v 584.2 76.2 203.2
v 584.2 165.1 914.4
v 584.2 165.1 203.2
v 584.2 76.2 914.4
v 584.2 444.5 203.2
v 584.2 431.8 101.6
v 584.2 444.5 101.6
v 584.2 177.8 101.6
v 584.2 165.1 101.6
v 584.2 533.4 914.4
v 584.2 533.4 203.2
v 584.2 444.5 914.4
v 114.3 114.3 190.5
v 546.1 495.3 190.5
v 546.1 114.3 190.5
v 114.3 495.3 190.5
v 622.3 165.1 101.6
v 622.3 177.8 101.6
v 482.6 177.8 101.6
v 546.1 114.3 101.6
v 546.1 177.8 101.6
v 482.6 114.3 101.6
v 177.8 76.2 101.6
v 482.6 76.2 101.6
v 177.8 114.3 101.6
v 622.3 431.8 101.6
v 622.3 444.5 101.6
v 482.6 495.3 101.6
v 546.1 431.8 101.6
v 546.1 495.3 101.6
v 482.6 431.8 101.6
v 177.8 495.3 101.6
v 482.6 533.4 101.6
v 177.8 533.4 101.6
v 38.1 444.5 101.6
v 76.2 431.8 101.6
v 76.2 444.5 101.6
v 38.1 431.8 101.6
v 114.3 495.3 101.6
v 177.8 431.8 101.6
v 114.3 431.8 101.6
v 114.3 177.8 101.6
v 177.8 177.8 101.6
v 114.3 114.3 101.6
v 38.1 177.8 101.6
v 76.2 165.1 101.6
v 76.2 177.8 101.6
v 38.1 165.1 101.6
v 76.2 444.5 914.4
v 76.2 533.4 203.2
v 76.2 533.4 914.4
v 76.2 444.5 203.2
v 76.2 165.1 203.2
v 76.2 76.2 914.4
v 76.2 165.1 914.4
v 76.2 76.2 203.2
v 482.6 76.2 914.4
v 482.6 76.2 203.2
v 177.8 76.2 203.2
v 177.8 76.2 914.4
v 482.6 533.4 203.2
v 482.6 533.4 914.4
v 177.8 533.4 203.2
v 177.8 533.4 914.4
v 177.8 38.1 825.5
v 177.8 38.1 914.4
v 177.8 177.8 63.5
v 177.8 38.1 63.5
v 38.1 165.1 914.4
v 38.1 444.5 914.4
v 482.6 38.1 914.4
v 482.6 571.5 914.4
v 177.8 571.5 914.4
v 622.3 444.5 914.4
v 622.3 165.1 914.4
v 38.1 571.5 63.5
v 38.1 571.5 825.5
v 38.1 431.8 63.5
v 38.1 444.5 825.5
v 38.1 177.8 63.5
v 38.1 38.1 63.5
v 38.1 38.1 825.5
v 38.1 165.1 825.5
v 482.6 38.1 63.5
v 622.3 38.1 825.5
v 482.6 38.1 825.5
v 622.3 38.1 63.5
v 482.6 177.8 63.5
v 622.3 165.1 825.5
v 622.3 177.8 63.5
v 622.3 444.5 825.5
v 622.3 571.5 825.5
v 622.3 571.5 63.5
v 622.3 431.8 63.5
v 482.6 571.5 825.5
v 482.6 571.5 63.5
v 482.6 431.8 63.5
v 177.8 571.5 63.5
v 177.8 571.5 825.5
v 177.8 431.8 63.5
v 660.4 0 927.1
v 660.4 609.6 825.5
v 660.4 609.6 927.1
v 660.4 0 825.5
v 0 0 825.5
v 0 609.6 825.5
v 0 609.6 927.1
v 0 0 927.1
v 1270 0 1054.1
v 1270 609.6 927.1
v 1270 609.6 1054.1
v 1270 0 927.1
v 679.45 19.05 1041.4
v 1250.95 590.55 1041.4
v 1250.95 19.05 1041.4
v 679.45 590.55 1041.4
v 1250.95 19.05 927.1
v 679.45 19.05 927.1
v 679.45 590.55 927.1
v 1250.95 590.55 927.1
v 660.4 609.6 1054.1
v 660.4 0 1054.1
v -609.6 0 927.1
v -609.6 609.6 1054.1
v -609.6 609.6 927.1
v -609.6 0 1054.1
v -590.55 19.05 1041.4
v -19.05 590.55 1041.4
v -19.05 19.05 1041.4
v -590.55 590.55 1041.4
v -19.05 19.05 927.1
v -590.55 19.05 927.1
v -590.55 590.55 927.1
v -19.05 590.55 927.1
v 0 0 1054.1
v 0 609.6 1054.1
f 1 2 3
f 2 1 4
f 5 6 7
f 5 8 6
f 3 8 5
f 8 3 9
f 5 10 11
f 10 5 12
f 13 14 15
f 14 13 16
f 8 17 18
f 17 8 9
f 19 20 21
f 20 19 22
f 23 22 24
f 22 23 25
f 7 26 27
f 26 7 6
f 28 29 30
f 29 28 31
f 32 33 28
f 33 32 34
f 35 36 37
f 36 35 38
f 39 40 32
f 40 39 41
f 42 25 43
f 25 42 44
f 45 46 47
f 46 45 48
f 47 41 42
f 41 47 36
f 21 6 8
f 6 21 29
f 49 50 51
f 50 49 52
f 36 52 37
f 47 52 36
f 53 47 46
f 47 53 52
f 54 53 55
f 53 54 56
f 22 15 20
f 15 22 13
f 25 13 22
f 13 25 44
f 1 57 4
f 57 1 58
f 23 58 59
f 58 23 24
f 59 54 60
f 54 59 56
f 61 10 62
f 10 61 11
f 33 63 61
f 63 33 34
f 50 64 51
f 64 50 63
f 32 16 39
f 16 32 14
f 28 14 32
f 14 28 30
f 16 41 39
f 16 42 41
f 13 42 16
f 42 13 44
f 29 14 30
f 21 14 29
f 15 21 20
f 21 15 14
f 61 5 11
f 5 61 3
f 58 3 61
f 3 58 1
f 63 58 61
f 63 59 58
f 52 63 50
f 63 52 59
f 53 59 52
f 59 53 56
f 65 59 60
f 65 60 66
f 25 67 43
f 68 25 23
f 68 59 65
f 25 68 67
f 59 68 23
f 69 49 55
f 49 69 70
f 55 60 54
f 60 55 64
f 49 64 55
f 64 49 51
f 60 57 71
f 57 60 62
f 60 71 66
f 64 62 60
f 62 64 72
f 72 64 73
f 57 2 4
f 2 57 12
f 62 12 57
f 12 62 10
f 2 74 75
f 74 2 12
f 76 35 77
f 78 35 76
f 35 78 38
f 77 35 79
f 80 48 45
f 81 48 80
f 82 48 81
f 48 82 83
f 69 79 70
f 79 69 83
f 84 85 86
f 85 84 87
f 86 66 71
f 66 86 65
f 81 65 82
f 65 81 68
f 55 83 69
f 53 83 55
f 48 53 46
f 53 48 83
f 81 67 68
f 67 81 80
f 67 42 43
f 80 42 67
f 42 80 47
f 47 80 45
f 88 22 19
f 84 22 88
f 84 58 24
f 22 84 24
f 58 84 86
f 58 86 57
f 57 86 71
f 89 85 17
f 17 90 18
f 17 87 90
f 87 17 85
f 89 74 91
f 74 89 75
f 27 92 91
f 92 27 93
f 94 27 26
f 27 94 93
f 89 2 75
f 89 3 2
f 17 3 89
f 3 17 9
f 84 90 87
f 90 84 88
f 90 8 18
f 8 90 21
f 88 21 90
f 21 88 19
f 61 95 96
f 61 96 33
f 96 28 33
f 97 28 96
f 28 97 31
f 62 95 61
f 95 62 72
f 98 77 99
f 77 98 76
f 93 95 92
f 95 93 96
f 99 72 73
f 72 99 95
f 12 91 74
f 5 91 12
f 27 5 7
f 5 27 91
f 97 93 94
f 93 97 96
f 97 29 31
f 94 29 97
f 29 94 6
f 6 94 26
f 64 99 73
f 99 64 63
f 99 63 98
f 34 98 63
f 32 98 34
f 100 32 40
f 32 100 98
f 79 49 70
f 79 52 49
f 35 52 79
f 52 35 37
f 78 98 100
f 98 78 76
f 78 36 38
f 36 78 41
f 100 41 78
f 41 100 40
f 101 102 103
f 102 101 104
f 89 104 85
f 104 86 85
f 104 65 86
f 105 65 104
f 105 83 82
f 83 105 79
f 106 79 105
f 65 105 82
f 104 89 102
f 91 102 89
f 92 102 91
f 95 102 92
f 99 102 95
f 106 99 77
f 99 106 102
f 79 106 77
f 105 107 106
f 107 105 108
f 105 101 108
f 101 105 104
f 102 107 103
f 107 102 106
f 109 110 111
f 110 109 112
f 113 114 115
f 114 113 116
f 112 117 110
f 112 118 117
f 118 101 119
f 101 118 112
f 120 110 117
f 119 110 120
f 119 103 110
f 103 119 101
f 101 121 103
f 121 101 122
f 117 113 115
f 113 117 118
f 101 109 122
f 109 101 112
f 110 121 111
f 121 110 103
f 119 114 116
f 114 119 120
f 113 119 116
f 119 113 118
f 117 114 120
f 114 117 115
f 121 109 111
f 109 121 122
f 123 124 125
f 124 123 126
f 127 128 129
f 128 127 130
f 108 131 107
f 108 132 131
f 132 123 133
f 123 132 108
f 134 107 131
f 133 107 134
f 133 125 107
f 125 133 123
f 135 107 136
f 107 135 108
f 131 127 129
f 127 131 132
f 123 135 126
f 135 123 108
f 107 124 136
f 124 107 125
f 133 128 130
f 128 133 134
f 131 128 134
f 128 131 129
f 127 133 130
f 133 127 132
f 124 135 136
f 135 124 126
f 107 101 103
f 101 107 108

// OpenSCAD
union() {
	scale(v = 25.4000000000) {
		translate(v = [3.0000000000, 3.0000000000, 4]) {
			cube(size = [20.0000000000, 1.5000000000, 3.5000000000]);
			translate(v = [0, 16.5000000000, 0]) {
				cube(size = [20.0000000000, 1.5000000000, 3.5000000000]);
			}
			translate(v = [0, 1.5000000000, 0]) {
				cube(size = [1.5000000000, 15.0000000000, 3.5000000000]);
			}
			translate(v = [18.5000000000, 1.5000000000, 0]) {
				cube(size = [1.5000000000, 15.0000000000, 3.5000000000]);
			}
			translate(v = [0, 0, 3.5000000000]) {
				cube(size = [20.0000000000, 18.0000000000, 0.5000000000]);
			}
		}
		translate(v = [1.5000000000, 1.5000000000, 4]) {
			cube(size = [5.5000000000, 1.5000000000, 32]);
			translate(v = [0, 1.5000000000, 0]) {
				cube(size = [1.5000000000, 3.5000000000, 32]);
			}
			translate(v = [0, 0, -1.5000000000]) {
				cube(size = [5.5000000000, 5.5000000000, 1.5000000000]);
			}
		}
		translate(v = [24.5000000000, 1.5000000000, 4]) {
			scale(v = [-1, 1, 1]) {
				cube(size = [5.5000000000, 1.5000000000, 32]);
				translate(v = [0, 1.5000000000, 0]) {
					cube(size = [1.5000000000, 3.5000000000, 32]);
				}
				translate(v = [0, 0, -1.5000000000]) {
					cube(size = [5.5000000000, 5.5000000000, 1.5000000000]);
				}
			}
		}
		translate(v = [24.5000000000, 22.5000000000, 4]) {
			scale(v = [-1, -1, 1]) {
				cube(size = [5.5000000000, 1.5000000000, 32]);
				translate(v = [0, 1.5000000000, 0]) {
					cube(size = [1.5000000000, 3.5000000000, 32]);
				}
				translate(v = [0, 0, -1.5000000000]) {
					cube(size = [5.5000000000, 5.5000000000, 1.5000000000]);
				}
			}
		}
		translate(v = [1.5000000000, 22.5000000000, 4]) {
			scale(v = [1, -1, 1]) {
				cube(size = [5.5000000000, 1.5000000000, 32]);
				translate(v = [0, 1.5000000000, 0]) {
					cube(size = [1.5000000000, 3.5000000000, 32]);
				}
				translate(v = [0, 0, -1.5000000000]) {
					cube(size = [5.5000000000, 5.5000000000, 1.5000000000]);
				}
			}
		}
		translate(v = [0, 0, 32.5000000000]) {
			cube(size = [26, 1.5000000000, 3.5000000000]);
			translate(v = [0, 22.5000000000, 0]) {
				cube(size = [26, 1.5000000000, 3.5000000000]);
			}
			translate(v = [0, 1.5000000000, 0]) {
				cube(size = [1.5000000000, 21.0000000000, 3.5000000000]);
			}
			translate(v = [24.5000000000, 1.5000000000, 0]) {
				cube(size = [1.5000000000, 21.0000000000, 3.5000000000]);
			}
		}
		translate(v = [0, 0, 36]) {
			cube(size = [26, 24, 0.5000000000]);
		}
		translate(v = [26, 0, 36.5000000000]) {
			rotate(a = 0, v = [0, 1, 0]) {
				cube(size = [24, 0.7500000000, 4.5000000000]);
				translate(v = [0, 23.2500000000, 0]) {
					cube(size = [24, 0.7500000000, 4.5000000000]);
				}
				translate(v = [0, 0.7500000000, 0]) {
					cube(size = [0.7500000000, 22.5000000000, 4.5000000000]);
				}
				translate(v = [23.2500000000, 0.7500000000, 0]) {
					cube(size = [0.7500000000, 22.5000000000, 4.5000000000]);
				}
				translate(v = [0, 0, 4.5000000000]) {
					cube(size = [24, 24, 0.5000000000]);
				}
			}
		}
		translate(v = [0, 0, 36.5000000000]) {
			scale(v = [-1, 1, 1]) {
				rotate(a = $t, v = [0, 1, 0]) {
					cube(size = [24, 0.7500000000, 4.5000000000]);
					translate(v = [0, 23.2500000000, 0]) {
						cube(size = [24, 0.7500000000, 4.5000000000]);
					}
					translate(v = [0, 0.7500000000, 0]) {
						cube(size = [0.7500000000, 22.5000000000, 4.5000000000]);
					}
					translate(v = [23.2500000000, 0.7500000000, 0]) {
						cube(size = [0.7500000000, 22.5000000000, 4.5000000000]);
					}
					translate(v = [0, 0, 4.5000000000]) {
						cube(size = [24, 24, 0.5000000000]);
					}
				}
			}
		}
	}
}
